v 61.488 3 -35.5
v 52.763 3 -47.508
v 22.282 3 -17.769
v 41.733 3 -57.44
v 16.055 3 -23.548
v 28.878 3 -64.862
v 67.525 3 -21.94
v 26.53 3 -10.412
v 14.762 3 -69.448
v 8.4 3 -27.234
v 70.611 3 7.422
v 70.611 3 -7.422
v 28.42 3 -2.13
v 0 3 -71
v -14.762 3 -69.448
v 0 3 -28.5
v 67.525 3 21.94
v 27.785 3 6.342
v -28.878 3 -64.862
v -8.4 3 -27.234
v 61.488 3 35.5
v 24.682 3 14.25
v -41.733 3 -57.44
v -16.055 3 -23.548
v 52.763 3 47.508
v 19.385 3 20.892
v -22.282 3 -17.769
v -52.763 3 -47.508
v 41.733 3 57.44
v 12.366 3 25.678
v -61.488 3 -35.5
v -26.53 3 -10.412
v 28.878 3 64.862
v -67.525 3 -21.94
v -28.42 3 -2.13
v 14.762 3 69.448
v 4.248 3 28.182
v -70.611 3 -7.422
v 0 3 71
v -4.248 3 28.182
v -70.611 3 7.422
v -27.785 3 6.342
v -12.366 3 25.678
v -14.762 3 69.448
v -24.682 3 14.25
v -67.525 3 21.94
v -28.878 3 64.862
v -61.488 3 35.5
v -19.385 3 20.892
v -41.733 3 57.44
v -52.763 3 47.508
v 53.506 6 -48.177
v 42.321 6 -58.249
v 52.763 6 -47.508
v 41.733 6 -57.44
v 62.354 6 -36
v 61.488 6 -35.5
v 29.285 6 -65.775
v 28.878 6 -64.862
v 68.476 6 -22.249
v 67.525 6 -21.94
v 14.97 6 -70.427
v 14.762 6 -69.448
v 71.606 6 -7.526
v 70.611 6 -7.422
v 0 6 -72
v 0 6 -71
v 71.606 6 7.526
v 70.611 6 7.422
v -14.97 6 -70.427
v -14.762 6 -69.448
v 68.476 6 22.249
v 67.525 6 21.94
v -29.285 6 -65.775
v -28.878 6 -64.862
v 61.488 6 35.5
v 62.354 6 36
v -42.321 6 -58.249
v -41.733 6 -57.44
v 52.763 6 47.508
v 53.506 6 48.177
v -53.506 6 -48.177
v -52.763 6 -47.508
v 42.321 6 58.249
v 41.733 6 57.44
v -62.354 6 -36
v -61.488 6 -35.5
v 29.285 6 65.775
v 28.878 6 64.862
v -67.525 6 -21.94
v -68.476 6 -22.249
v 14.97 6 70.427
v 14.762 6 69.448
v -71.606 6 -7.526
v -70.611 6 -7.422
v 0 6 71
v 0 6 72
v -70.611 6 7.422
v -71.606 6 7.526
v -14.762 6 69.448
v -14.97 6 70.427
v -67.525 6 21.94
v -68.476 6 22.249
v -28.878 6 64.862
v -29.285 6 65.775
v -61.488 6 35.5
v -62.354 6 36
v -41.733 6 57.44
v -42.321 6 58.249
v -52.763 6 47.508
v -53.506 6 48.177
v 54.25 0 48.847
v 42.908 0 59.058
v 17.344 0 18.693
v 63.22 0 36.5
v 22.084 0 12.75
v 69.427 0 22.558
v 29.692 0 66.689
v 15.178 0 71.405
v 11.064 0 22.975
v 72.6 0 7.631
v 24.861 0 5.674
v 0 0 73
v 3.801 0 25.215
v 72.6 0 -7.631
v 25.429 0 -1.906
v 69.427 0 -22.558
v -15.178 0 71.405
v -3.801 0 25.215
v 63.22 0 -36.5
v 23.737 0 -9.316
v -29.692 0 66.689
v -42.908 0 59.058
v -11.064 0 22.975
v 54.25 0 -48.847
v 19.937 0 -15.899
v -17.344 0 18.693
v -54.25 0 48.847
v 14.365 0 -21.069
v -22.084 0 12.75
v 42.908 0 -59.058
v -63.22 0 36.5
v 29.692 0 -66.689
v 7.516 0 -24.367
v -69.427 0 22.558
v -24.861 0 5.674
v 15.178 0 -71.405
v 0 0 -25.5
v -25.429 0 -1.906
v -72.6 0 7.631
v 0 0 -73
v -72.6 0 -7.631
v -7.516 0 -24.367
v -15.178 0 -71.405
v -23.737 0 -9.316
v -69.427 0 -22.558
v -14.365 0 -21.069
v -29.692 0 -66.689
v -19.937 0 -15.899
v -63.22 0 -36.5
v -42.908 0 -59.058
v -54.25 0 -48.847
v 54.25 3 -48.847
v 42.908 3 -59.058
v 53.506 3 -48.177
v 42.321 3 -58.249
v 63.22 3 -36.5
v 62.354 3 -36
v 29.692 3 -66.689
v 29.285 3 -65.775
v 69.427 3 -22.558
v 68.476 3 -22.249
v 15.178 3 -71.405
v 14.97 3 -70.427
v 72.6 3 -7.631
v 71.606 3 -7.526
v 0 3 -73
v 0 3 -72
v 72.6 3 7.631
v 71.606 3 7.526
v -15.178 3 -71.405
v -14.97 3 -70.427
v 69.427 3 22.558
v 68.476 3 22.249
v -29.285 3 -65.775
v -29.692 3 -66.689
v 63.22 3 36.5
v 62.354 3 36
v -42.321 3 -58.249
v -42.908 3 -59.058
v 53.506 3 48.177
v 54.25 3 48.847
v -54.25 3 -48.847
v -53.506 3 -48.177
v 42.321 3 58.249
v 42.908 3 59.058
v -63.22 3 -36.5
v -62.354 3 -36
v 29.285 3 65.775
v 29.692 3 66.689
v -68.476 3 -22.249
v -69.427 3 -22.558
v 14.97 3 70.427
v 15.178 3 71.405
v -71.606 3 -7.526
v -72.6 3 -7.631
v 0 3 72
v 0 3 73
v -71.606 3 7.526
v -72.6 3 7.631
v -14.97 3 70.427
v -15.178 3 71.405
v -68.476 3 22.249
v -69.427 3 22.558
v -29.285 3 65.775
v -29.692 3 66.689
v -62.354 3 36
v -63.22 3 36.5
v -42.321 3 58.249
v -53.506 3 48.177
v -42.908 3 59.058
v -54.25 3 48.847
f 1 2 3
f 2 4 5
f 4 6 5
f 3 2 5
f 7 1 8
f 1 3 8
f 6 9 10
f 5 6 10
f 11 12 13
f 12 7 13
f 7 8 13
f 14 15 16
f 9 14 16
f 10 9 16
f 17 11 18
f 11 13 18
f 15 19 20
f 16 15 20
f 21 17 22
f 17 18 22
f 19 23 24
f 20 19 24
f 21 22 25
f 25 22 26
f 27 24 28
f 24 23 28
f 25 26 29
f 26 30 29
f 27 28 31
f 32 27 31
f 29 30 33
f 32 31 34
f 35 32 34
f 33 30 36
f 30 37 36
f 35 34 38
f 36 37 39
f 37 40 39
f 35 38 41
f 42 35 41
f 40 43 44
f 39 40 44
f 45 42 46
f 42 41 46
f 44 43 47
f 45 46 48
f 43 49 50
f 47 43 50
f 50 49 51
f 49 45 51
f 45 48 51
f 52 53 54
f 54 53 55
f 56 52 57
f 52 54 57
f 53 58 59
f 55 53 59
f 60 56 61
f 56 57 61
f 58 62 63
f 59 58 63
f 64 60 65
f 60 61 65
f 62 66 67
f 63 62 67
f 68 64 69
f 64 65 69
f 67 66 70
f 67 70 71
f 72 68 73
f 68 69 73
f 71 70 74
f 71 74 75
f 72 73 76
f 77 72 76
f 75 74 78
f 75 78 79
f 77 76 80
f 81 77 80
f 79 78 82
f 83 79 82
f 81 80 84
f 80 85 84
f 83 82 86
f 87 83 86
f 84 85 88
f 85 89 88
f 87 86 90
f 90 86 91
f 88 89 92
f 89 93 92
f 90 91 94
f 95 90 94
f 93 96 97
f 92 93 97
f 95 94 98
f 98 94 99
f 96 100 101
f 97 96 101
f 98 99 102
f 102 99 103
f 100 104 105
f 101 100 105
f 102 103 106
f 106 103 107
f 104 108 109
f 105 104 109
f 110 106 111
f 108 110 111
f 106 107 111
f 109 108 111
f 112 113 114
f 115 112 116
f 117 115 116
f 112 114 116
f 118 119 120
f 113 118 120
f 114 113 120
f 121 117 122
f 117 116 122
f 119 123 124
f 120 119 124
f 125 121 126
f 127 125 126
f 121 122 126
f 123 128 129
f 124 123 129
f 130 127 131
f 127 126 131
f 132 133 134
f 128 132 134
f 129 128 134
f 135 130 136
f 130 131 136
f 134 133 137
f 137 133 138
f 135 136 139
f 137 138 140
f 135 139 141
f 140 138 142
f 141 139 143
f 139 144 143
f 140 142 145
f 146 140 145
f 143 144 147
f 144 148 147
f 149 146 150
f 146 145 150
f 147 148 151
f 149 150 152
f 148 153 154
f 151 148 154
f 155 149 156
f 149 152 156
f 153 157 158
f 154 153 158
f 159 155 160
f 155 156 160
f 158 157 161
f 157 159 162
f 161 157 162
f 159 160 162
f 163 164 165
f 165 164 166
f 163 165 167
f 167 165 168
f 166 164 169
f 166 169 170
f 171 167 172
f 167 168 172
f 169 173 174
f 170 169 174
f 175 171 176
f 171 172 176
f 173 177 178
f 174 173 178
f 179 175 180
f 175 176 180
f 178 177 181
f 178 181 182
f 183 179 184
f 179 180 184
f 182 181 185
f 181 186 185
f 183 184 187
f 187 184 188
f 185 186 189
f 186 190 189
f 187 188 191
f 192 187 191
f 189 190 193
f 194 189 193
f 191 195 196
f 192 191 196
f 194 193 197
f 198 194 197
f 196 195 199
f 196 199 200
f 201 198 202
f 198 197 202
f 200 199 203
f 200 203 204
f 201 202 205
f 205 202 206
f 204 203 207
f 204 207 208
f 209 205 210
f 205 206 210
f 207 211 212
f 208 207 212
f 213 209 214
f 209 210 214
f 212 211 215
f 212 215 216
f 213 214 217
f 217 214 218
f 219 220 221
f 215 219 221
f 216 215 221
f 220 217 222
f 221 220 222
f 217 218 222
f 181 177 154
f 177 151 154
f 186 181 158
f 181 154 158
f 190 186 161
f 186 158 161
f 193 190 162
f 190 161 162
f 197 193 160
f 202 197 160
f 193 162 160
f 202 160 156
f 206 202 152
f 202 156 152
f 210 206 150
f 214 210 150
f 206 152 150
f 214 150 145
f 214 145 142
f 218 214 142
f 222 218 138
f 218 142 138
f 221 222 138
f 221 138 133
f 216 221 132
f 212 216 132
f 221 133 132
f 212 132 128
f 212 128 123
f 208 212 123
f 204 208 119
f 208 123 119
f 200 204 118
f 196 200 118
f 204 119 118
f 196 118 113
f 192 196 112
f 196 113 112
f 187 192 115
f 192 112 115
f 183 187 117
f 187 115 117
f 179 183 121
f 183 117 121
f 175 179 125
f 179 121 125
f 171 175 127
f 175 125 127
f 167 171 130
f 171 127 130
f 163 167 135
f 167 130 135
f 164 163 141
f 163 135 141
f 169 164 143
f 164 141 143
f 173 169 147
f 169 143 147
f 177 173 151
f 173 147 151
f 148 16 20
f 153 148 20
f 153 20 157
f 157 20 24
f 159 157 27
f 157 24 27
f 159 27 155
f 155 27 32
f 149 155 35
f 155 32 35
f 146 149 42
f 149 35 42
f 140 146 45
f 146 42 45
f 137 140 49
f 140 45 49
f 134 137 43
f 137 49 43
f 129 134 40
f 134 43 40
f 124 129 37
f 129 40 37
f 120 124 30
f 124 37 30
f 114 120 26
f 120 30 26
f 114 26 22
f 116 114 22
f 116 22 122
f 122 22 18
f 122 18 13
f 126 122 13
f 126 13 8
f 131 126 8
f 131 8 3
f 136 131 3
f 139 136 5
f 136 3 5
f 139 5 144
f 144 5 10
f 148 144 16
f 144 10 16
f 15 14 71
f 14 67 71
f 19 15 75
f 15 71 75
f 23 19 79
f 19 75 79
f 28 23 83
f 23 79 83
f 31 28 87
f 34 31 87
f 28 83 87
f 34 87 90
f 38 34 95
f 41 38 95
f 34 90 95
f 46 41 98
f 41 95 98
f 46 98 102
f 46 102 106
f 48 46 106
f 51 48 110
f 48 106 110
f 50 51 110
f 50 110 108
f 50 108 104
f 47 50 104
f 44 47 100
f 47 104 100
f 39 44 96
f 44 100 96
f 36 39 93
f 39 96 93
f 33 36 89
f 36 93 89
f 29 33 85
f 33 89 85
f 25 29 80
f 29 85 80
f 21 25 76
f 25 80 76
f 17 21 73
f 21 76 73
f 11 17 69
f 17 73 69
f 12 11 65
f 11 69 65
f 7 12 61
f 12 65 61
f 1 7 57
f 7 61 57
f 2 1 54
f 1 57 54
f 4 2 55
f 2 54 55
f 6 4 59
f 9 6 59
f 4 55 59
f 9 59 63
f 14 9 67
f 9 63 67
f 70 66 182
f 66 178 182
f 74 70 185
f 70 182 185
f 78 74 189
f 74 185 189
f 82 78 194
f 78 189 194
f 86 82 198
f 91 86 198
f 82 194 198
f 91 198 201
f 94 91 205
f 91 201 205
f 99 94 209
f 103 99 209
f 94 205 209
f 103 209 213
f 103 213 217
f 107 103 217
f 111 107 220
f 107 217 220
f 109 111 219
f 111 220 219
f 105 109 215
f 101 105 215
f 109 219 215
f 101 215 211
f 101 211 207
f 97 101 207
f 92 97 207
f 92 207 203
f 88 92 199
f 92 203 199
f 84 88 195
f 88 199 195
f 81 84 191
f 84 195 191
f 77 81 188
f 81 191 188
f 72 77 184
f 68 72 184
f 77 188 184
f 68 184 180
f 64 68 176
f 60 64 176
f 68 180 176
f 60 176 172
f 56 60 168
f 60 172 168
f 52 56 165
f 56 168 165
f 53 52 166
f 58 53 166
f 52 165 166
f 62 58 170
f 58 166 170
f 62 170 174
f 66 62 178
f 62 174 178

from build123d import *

# Parameters (mm, degrees)
SMUSSO1_SIZE = 3


with BuildPart() as part:
    # Schizzo1 → Rivoluzione1 (revolve)
    with BuildSketch(Plane.XY, mode=Mode.PRIVATE) as rivoluzione1_sk:
        Polygon((-25.5, 0), (-25.5, 3), (-71, 3), (-71, 6), (-72, 6), (-72, 3), (-73, 3), (-73, 0), align=None)
    revolve(rivoluzione1_sk.sketch.rotate(Axis((0, 0, 0), (0, 1, 0)), 270), axis=Axis((0, 0, 0), (0, 1, 0)))

    # Smusso1
    smusso1_edges = [part.edges().sort_by_distance(p)[0] for p in [
        (0, 3, 25.5),
    ]]
    chamfer(smusso1_edges, length=SMUSSO1_SIZE - 0.0001)  # a hair under: the kernel refuses the full size


solid = part.part
